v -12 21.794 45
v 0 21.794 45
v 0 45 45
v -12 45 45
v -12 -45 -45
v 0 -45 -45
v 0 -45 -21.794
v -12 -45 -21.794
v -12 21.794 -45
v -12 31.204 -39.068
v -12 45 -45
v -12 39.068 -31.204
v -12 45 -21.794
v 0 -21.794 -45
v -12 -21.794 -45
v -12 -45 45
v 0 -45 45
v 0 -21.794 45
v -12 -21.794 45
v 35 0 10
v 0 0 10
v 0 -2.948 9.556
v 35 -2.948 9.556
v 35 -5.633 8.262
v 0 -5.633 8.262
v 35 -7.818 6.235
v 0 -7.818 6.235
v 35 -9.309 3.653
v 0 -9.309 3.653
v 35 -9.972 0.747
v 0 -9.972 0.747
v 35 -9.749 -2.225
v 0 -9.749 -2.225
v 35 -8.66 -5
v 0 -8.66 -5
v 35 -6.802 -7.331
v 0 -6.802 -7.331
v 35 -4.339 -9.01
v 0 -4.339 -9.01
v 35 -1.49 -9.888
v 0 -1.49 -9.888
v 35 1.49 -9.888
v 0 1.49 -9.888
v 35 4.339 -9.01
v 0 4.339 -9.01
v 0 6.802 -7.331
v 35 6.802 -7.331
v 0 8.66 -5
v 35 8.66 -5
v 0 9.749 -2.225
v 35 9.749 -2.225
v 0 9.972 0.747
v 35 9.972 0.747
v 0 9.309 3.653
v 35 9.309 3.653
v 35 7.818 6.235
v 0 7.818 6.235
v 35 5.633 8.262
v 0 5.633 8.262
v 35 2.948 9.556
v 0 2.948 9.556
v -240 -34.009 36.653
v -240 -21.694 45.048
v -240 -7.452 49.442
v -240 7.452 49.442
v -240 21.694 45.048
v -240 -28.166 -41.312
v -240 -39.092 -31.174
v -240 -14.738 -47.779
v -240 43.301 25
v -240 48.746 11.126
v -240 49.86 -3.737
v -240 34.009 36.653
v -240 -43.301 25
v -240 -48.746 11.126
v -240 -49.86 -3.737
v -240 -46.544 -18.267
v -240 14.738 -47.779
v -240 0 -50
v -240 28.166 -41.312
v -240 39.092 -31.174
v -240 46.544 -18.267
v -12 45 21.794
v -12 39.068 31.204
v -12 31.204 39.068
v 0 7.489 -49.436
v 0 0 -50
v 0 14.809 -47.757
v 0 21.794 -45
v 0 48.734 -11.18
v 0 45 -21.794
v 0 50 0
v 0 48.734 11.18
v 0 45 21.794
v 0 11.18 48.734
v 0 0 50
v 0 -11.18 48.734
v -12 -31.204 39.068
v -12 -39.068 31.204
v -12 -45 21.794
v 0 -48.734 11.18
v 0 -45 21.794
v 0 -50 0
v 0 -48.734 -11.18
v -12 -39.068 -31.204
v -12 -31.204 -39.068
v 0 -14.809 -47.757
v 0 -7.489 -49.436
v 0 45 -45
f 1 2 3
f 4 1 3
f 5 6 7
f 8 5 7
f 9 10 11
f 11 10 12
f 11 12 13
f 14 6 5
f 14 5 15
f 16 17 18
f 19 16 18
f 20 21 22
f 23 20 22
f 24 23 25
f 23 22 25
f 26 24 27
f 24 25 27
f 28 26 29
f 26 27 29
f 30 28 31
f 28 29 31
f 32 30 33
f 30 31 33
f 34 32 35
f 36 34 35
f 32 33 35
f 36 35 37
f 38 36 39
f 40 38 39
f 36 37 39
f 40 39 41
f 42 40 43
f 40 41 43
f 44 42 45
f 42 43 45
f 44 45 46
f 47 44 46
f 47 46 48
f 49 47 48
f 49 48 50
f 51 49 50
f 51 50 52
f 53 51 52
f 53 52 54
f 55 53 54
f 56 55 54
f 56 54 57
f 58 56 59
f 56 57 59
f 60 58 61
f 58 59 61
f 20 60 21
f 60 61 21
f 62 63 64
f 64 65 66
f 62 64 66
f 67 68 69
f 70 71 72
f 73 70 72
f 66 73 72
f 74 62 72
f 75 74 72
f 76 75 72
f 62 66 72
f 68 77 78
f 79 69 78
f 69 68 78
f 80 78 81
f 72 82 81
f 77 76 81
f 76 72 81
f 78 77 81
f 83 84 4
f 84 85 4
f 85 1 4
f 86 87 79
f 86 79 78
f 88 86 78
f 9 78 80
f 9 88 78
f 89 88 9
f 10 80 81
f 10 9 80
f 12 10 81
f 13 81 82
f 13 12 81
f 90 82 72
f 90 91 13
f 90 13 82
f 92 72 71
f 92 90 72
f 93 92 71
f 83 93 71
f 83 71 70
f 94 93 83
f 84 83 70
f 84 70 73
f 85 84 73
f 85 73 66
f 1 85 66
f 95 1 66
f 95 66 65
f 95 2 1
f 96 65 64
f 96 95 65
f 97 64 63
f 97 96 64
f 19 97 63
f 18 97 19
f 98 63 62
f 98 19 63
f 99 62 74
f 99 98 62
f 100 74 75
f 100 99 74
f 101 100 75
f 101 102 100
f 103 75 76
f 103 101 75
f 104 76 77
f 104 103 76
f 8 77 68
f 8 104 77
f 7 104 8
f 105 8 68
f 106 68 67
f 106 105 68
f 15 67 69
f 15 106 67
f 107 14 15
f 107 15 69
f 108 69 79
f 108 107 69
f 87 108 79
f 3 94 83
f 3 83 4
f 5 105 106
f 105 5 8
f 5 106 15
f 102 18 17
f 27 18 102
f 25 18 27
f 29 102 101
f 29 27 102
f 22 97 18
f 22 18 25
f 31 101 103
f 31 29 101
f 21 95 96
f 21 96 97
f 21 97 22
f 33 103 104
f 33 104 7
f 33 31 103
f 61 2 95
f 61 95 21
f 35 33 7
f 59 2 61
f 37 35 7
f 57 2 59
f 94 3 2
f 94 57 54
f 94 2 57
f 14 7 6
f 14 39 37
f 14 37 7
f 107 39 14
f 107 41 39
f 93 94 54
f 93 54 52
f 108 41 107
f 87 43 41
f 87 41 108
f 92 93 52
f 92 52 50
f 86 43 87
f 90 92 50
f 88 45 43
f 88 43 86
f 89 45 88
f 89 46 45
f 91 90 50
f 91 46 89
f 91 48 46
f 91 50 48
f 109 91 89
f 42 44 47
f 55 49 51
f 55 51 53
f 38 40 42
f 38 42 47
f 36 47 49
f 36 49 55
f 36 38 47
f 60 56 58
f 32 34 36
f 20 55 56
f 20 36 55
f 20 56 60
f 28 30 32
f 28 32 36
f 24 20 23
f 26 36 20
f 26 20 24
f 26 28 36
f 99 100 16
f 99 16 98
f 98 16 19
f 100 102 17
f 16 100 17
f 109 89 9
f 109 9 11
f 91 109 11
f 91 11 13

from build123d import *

# Parameters (mm, degrees)
SKETCH1_W           = 90
SKETCH1_H           = 90
BOSS_EXTRUDE1_DEPTH = 12
SKETCH2_R           = 50
BOSS_EXTRUDE2_DEPTH = 240
SKETCH3_R           = 10
BOSS_EXTRUDE3_DEPTH = 35


with BuildPart() as part:
    # Sketch1 → Boss-Extrude1 (new body)
    with BuildSketch(Plane.YZ):
        Rectangle(SKETCH1_W, SKETCH1_H)
    extrude(amount=-BOSS_EXTRUDE1_DEPTH)

    # Sketch2 → Boss-Extrude2 (add)
    with BuildSketch(Plane.YZ):
        with Locations(Location((0, 0, 0), (0, 0, 270))):
            Circle(SKETCH2_R)
    extrude(amount=-BOSS_EXTRUDE2_DEPTH)

    # Sketch3 → Boss-Extrude3 (add)
    with BuildSketch(Plane(origin=(0, 0, 0), x_dir=(0, 0, -1), z_dir=(1, 0, 0))):
        with Locations(Location((0, 0, 0), (0, 0, 180))):
            Circle(SKETCH3_R)
    extrude(amount=BOSS_EXTRUDE3_DEPTH)


solid = part.part
